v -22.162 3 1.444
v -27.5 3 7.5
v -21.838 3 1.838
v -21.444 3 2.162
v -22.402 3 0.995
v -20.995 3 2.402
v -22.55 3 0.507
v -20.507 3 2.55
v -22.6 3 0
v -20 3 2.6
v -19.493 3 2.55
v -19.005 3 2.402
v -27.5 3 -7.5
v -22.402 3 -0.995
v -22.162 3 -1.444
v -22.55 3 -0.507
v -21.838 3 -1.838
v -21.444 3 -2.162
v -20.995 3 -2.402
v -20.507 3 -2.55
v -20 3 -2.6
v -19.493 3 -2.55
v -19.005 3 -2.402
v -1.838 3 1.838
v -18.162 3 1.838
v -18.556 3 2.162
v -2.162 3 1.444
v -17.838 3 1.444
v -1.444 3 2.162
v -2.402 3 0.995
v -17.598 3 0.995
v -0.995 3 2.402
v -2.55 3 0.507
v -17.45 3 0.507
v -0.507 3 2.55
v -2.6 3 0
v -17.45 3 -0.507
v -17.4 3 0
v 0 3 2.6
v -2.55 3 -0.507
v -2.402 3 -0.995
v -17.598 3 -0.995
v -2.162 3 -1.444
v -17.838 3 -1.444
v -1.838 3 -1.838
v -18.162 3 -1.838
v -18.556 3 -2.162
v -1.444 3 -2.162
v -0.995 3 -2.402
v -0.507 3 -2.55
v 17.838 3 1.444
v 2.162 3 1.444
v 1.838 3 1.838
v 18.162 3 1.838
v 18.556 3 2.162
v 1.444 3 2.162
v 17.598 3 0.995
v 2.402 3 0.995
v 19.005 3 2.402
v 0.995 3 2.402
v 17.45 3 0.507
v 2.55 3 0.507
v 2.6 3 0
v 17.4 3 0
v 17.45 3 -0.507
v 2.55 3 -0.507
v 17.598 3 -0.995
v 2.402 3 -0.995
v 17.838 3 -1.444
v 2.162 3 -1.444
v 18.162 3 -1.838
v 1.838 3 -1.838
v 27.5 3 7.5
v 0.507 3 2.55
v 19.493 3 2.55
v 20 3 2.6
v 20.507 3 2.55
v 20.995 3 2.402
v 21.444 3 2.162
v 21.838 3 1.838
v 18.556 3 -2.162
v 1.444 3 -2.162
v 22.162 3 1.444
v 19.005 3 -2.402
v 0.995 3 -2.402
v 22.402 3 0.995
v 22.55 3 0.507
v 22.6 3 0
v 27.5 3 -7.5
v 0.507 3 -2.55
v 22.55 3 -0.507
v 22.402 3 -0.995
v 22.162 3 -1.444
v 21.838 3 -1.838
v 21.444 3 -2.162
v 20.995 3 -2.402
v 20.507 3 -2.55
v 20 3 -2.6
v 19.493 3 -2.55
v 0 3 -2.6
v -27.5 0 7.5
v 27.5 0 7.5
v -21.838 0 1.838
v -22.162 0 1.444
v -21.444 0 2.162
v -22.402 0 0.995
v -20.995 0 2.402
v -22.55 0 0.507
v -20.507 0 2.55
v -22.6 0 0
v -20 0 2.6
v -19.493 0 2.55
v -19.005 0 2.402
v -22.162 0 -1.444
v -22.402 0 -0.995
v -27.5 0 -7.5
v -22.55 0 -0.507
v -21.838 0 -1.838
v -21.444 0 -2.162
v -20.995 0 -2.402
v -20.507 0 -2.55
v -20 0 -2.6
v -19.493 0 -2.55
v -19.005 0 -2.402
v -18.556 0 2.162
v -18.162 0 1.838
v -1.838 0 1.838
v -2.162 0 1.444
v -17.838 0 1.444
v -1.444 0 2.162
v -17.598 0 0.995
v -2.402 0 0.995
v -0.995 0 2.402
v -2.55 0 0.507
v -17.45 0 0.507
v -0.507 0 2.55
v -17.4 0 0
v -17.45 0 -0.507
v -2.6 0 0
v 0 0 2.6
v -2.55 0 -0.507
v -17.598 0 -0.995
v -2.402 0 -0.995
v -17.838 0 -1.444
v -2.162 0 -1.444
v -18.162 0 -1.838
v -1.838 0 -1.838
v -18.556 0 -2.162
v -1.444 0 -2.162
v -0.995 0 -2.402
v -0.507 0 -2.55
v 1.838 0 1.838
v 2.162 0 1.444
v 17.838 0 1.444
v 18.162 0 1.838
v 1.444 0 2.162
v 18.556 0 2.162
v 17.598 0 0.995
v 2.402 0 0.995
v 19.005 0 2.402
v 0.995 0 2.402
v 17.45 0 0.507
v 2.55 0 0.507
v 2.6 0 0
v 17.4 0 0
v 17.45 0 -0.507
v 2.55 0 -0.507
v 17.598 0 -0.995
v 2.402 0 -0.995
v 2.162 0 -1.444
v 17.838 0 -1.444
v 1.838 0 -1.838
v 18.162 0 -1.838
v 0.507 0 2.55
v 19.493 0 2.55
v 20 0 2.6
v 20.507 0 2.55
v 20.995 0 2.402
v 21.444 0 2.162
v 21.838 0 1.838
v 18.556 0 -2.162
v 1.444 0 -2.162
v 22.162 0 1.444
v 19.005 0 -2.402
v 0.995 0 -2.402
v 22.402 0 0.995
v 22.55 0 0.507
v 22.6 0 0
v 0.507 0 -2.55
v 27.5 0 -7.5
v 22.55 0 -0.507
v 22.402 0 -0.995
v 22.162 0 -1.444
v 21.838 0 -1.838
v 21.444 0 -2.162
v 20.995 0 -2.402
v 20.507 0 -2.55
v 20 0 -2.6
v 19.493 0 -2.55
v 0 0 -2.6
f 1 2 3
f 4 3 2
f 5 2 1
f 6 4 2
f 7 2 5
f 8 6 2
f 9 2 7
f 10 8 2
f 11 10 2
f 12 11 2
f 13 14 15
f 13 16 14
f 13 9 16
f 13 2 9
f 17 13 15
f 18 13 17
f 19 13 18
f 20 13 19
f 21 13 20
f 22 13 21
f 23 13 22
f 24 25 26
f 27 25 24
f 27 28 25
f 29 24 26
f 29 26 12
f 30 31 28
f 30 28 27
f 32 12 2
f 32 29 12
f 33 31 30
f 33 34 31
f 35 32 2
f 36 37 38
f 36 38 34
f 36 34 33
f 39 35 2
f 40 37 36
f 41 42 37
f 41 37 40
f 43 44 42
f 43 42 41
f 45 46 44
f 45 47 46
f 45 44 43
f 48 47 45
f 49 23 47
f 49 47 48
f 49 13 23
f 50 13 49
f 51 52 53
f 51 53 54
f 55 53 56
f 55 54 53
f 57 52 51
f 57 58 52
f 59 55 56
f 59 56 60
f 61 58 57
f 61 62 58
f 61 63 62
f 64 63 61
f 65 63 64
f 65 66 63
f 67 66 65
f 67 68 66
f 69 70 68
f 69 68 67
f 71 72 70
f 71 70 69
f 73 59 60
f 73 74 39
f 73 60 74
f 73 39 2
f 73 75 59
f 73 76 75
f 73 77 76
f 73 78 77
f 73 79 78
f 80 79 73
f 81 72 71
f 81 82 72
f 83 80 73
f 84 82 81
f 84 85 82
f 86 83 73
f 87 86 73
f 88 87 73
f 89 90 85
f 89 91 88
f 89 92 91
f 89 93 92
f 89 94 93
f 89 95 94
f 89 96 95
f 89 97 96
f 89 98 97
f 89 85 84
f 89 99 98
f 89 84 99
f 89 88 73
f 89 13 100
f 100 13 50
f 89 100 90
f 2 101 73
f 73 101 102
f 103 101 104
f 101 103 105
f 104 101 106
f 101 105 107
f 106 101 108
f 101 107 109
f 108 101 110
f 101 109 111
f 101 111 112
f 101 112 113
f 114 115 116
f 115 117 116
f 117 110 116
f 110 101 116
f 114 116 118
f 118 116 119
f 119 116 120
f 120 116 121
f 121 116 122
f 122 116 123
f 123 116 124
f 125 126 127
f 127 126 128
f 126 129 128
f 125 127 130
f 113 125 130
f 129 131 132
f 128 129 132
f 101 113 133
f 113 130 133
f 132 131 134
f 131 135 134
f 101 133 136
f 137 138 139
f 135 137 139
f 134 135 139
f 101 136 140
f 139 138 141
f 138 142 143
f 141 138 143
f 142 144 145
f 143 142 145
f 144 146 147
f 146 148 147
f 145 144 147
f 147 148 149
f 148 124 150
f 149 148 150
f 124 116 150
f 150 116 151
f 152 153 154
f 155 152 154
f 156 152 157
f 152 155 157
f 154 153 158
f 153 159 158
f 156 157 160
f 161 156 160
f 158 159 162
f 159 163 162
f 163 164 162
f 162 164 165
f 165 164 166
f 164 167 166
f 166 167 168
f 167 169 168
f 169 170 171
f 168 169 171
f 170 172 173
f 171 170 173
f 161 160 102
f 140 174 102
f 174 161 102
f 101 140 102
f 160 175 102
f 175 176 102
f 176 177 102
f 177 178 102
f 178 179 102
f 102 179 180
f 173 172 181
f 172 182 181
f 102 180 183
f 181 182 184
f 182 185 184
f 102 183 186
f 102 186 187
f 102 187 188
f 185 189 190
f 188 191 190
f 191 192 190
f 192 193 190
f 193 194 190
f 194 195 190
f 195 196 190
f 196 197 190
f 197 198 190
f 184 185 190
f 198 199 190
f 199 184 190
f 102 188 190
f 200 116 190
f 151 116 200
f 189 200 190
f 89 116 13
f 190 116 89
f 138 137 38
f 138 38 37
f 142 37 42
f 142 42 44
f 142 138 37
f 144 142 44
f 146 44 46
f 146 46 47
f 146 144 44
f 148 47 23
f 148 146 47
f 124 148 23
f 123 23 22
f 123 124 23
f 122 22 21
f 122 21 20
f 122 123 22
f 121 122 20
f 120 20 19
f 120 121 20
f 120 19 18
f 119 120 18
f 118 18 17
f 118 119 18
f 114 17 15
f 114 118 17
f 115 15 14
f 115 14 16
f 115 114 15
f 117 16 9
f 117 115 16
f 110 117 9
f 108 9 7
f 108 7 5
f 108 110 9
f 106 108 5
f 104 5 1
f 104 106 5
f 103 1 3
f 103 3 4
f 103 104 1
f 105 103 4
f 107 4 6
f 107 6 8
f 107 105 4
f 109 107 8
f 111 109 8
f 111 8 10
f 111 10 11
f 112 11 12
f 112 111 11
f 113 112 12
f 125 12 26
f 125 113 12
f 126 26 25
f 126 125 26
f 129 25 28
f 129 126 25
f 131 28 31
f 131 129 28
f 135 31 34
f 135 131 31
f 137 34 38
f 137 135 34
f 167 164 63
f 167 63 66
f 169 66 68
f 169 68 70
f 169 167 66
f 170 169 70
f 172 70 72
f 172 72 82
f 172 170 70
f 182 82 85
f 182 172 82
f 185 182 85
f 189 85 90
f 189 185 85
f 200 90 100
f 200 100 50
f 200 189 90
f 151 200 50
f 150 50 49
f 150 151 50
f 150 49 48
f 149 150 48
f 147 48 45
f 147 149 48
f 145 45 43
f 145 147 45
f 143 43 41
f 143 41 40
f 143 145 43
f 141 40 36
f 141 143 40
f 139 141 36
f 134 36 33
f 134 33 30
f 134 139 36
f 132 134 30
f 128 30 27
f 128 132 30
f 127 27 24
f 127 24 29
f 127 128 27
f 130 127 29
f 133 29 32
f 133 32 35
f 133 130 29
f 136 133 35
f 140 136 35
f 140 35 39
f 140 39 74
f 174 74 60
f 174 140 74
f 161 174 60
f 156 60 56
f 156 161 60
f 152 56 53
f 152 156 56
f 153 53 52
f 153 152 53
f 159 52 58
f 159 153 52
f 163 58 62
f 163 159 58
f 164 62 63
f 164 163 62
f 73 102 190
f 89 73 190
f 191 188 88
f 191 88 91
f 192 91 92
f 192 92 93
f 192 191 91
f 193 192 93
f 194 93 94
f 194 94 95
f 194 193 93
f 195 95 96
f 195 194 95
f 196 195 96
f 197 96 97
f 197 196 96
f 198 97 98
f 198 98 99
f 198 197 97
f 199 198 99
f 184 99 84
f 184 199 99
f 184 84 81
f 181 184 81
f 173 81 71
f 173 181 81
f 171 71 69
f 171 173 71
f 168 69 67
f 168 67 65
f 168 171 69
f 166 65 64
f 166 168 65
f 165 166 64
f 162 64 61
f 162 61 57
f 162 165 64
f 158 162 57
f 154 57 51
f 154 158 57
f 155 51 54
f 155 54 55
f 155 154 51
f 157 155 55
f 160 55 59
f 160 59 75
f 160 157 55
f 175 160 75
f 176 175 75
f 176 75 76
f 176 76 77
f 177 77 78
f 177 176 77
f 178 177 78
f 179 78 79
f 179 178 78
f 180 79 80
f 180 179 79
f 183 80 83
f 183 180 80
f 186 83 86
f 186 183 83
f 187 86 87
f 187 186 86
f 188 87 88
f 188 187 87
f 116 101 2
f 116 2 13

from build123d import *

# Parameters (mm, degrees)
SKETCH_1_W      = 55
SKETCH_1_H      = 15
SKETCH_1_R      = 2.6
EXTRUDE_1_DEPTH = 3


with BuildPart() as part:
    # Эскиз1 → Бобышка-Вытянуть1 (new body)
    with BuildSketch(Plane(origin=(0, 0, 0), x_dir=(1, 0, 0), z_dir=(0, 1, 0))):
        Rectangle(SKETCH_1_W, SKETCH_1_H)
        Circle(SKETCH_1_R, mode=Mode.SUBTRACT)
        with Locations((20, 0)):
            Circle(SKETCH_1_R, mode=Mode.SUBTRACT)
        with Locations((-20, 0)):
            Circle(SKETCH_1_R, mode=Mode.SUBTRACT)
    extrude(amount=EXTRUDE_1_DEPTH)


solid = part.part
